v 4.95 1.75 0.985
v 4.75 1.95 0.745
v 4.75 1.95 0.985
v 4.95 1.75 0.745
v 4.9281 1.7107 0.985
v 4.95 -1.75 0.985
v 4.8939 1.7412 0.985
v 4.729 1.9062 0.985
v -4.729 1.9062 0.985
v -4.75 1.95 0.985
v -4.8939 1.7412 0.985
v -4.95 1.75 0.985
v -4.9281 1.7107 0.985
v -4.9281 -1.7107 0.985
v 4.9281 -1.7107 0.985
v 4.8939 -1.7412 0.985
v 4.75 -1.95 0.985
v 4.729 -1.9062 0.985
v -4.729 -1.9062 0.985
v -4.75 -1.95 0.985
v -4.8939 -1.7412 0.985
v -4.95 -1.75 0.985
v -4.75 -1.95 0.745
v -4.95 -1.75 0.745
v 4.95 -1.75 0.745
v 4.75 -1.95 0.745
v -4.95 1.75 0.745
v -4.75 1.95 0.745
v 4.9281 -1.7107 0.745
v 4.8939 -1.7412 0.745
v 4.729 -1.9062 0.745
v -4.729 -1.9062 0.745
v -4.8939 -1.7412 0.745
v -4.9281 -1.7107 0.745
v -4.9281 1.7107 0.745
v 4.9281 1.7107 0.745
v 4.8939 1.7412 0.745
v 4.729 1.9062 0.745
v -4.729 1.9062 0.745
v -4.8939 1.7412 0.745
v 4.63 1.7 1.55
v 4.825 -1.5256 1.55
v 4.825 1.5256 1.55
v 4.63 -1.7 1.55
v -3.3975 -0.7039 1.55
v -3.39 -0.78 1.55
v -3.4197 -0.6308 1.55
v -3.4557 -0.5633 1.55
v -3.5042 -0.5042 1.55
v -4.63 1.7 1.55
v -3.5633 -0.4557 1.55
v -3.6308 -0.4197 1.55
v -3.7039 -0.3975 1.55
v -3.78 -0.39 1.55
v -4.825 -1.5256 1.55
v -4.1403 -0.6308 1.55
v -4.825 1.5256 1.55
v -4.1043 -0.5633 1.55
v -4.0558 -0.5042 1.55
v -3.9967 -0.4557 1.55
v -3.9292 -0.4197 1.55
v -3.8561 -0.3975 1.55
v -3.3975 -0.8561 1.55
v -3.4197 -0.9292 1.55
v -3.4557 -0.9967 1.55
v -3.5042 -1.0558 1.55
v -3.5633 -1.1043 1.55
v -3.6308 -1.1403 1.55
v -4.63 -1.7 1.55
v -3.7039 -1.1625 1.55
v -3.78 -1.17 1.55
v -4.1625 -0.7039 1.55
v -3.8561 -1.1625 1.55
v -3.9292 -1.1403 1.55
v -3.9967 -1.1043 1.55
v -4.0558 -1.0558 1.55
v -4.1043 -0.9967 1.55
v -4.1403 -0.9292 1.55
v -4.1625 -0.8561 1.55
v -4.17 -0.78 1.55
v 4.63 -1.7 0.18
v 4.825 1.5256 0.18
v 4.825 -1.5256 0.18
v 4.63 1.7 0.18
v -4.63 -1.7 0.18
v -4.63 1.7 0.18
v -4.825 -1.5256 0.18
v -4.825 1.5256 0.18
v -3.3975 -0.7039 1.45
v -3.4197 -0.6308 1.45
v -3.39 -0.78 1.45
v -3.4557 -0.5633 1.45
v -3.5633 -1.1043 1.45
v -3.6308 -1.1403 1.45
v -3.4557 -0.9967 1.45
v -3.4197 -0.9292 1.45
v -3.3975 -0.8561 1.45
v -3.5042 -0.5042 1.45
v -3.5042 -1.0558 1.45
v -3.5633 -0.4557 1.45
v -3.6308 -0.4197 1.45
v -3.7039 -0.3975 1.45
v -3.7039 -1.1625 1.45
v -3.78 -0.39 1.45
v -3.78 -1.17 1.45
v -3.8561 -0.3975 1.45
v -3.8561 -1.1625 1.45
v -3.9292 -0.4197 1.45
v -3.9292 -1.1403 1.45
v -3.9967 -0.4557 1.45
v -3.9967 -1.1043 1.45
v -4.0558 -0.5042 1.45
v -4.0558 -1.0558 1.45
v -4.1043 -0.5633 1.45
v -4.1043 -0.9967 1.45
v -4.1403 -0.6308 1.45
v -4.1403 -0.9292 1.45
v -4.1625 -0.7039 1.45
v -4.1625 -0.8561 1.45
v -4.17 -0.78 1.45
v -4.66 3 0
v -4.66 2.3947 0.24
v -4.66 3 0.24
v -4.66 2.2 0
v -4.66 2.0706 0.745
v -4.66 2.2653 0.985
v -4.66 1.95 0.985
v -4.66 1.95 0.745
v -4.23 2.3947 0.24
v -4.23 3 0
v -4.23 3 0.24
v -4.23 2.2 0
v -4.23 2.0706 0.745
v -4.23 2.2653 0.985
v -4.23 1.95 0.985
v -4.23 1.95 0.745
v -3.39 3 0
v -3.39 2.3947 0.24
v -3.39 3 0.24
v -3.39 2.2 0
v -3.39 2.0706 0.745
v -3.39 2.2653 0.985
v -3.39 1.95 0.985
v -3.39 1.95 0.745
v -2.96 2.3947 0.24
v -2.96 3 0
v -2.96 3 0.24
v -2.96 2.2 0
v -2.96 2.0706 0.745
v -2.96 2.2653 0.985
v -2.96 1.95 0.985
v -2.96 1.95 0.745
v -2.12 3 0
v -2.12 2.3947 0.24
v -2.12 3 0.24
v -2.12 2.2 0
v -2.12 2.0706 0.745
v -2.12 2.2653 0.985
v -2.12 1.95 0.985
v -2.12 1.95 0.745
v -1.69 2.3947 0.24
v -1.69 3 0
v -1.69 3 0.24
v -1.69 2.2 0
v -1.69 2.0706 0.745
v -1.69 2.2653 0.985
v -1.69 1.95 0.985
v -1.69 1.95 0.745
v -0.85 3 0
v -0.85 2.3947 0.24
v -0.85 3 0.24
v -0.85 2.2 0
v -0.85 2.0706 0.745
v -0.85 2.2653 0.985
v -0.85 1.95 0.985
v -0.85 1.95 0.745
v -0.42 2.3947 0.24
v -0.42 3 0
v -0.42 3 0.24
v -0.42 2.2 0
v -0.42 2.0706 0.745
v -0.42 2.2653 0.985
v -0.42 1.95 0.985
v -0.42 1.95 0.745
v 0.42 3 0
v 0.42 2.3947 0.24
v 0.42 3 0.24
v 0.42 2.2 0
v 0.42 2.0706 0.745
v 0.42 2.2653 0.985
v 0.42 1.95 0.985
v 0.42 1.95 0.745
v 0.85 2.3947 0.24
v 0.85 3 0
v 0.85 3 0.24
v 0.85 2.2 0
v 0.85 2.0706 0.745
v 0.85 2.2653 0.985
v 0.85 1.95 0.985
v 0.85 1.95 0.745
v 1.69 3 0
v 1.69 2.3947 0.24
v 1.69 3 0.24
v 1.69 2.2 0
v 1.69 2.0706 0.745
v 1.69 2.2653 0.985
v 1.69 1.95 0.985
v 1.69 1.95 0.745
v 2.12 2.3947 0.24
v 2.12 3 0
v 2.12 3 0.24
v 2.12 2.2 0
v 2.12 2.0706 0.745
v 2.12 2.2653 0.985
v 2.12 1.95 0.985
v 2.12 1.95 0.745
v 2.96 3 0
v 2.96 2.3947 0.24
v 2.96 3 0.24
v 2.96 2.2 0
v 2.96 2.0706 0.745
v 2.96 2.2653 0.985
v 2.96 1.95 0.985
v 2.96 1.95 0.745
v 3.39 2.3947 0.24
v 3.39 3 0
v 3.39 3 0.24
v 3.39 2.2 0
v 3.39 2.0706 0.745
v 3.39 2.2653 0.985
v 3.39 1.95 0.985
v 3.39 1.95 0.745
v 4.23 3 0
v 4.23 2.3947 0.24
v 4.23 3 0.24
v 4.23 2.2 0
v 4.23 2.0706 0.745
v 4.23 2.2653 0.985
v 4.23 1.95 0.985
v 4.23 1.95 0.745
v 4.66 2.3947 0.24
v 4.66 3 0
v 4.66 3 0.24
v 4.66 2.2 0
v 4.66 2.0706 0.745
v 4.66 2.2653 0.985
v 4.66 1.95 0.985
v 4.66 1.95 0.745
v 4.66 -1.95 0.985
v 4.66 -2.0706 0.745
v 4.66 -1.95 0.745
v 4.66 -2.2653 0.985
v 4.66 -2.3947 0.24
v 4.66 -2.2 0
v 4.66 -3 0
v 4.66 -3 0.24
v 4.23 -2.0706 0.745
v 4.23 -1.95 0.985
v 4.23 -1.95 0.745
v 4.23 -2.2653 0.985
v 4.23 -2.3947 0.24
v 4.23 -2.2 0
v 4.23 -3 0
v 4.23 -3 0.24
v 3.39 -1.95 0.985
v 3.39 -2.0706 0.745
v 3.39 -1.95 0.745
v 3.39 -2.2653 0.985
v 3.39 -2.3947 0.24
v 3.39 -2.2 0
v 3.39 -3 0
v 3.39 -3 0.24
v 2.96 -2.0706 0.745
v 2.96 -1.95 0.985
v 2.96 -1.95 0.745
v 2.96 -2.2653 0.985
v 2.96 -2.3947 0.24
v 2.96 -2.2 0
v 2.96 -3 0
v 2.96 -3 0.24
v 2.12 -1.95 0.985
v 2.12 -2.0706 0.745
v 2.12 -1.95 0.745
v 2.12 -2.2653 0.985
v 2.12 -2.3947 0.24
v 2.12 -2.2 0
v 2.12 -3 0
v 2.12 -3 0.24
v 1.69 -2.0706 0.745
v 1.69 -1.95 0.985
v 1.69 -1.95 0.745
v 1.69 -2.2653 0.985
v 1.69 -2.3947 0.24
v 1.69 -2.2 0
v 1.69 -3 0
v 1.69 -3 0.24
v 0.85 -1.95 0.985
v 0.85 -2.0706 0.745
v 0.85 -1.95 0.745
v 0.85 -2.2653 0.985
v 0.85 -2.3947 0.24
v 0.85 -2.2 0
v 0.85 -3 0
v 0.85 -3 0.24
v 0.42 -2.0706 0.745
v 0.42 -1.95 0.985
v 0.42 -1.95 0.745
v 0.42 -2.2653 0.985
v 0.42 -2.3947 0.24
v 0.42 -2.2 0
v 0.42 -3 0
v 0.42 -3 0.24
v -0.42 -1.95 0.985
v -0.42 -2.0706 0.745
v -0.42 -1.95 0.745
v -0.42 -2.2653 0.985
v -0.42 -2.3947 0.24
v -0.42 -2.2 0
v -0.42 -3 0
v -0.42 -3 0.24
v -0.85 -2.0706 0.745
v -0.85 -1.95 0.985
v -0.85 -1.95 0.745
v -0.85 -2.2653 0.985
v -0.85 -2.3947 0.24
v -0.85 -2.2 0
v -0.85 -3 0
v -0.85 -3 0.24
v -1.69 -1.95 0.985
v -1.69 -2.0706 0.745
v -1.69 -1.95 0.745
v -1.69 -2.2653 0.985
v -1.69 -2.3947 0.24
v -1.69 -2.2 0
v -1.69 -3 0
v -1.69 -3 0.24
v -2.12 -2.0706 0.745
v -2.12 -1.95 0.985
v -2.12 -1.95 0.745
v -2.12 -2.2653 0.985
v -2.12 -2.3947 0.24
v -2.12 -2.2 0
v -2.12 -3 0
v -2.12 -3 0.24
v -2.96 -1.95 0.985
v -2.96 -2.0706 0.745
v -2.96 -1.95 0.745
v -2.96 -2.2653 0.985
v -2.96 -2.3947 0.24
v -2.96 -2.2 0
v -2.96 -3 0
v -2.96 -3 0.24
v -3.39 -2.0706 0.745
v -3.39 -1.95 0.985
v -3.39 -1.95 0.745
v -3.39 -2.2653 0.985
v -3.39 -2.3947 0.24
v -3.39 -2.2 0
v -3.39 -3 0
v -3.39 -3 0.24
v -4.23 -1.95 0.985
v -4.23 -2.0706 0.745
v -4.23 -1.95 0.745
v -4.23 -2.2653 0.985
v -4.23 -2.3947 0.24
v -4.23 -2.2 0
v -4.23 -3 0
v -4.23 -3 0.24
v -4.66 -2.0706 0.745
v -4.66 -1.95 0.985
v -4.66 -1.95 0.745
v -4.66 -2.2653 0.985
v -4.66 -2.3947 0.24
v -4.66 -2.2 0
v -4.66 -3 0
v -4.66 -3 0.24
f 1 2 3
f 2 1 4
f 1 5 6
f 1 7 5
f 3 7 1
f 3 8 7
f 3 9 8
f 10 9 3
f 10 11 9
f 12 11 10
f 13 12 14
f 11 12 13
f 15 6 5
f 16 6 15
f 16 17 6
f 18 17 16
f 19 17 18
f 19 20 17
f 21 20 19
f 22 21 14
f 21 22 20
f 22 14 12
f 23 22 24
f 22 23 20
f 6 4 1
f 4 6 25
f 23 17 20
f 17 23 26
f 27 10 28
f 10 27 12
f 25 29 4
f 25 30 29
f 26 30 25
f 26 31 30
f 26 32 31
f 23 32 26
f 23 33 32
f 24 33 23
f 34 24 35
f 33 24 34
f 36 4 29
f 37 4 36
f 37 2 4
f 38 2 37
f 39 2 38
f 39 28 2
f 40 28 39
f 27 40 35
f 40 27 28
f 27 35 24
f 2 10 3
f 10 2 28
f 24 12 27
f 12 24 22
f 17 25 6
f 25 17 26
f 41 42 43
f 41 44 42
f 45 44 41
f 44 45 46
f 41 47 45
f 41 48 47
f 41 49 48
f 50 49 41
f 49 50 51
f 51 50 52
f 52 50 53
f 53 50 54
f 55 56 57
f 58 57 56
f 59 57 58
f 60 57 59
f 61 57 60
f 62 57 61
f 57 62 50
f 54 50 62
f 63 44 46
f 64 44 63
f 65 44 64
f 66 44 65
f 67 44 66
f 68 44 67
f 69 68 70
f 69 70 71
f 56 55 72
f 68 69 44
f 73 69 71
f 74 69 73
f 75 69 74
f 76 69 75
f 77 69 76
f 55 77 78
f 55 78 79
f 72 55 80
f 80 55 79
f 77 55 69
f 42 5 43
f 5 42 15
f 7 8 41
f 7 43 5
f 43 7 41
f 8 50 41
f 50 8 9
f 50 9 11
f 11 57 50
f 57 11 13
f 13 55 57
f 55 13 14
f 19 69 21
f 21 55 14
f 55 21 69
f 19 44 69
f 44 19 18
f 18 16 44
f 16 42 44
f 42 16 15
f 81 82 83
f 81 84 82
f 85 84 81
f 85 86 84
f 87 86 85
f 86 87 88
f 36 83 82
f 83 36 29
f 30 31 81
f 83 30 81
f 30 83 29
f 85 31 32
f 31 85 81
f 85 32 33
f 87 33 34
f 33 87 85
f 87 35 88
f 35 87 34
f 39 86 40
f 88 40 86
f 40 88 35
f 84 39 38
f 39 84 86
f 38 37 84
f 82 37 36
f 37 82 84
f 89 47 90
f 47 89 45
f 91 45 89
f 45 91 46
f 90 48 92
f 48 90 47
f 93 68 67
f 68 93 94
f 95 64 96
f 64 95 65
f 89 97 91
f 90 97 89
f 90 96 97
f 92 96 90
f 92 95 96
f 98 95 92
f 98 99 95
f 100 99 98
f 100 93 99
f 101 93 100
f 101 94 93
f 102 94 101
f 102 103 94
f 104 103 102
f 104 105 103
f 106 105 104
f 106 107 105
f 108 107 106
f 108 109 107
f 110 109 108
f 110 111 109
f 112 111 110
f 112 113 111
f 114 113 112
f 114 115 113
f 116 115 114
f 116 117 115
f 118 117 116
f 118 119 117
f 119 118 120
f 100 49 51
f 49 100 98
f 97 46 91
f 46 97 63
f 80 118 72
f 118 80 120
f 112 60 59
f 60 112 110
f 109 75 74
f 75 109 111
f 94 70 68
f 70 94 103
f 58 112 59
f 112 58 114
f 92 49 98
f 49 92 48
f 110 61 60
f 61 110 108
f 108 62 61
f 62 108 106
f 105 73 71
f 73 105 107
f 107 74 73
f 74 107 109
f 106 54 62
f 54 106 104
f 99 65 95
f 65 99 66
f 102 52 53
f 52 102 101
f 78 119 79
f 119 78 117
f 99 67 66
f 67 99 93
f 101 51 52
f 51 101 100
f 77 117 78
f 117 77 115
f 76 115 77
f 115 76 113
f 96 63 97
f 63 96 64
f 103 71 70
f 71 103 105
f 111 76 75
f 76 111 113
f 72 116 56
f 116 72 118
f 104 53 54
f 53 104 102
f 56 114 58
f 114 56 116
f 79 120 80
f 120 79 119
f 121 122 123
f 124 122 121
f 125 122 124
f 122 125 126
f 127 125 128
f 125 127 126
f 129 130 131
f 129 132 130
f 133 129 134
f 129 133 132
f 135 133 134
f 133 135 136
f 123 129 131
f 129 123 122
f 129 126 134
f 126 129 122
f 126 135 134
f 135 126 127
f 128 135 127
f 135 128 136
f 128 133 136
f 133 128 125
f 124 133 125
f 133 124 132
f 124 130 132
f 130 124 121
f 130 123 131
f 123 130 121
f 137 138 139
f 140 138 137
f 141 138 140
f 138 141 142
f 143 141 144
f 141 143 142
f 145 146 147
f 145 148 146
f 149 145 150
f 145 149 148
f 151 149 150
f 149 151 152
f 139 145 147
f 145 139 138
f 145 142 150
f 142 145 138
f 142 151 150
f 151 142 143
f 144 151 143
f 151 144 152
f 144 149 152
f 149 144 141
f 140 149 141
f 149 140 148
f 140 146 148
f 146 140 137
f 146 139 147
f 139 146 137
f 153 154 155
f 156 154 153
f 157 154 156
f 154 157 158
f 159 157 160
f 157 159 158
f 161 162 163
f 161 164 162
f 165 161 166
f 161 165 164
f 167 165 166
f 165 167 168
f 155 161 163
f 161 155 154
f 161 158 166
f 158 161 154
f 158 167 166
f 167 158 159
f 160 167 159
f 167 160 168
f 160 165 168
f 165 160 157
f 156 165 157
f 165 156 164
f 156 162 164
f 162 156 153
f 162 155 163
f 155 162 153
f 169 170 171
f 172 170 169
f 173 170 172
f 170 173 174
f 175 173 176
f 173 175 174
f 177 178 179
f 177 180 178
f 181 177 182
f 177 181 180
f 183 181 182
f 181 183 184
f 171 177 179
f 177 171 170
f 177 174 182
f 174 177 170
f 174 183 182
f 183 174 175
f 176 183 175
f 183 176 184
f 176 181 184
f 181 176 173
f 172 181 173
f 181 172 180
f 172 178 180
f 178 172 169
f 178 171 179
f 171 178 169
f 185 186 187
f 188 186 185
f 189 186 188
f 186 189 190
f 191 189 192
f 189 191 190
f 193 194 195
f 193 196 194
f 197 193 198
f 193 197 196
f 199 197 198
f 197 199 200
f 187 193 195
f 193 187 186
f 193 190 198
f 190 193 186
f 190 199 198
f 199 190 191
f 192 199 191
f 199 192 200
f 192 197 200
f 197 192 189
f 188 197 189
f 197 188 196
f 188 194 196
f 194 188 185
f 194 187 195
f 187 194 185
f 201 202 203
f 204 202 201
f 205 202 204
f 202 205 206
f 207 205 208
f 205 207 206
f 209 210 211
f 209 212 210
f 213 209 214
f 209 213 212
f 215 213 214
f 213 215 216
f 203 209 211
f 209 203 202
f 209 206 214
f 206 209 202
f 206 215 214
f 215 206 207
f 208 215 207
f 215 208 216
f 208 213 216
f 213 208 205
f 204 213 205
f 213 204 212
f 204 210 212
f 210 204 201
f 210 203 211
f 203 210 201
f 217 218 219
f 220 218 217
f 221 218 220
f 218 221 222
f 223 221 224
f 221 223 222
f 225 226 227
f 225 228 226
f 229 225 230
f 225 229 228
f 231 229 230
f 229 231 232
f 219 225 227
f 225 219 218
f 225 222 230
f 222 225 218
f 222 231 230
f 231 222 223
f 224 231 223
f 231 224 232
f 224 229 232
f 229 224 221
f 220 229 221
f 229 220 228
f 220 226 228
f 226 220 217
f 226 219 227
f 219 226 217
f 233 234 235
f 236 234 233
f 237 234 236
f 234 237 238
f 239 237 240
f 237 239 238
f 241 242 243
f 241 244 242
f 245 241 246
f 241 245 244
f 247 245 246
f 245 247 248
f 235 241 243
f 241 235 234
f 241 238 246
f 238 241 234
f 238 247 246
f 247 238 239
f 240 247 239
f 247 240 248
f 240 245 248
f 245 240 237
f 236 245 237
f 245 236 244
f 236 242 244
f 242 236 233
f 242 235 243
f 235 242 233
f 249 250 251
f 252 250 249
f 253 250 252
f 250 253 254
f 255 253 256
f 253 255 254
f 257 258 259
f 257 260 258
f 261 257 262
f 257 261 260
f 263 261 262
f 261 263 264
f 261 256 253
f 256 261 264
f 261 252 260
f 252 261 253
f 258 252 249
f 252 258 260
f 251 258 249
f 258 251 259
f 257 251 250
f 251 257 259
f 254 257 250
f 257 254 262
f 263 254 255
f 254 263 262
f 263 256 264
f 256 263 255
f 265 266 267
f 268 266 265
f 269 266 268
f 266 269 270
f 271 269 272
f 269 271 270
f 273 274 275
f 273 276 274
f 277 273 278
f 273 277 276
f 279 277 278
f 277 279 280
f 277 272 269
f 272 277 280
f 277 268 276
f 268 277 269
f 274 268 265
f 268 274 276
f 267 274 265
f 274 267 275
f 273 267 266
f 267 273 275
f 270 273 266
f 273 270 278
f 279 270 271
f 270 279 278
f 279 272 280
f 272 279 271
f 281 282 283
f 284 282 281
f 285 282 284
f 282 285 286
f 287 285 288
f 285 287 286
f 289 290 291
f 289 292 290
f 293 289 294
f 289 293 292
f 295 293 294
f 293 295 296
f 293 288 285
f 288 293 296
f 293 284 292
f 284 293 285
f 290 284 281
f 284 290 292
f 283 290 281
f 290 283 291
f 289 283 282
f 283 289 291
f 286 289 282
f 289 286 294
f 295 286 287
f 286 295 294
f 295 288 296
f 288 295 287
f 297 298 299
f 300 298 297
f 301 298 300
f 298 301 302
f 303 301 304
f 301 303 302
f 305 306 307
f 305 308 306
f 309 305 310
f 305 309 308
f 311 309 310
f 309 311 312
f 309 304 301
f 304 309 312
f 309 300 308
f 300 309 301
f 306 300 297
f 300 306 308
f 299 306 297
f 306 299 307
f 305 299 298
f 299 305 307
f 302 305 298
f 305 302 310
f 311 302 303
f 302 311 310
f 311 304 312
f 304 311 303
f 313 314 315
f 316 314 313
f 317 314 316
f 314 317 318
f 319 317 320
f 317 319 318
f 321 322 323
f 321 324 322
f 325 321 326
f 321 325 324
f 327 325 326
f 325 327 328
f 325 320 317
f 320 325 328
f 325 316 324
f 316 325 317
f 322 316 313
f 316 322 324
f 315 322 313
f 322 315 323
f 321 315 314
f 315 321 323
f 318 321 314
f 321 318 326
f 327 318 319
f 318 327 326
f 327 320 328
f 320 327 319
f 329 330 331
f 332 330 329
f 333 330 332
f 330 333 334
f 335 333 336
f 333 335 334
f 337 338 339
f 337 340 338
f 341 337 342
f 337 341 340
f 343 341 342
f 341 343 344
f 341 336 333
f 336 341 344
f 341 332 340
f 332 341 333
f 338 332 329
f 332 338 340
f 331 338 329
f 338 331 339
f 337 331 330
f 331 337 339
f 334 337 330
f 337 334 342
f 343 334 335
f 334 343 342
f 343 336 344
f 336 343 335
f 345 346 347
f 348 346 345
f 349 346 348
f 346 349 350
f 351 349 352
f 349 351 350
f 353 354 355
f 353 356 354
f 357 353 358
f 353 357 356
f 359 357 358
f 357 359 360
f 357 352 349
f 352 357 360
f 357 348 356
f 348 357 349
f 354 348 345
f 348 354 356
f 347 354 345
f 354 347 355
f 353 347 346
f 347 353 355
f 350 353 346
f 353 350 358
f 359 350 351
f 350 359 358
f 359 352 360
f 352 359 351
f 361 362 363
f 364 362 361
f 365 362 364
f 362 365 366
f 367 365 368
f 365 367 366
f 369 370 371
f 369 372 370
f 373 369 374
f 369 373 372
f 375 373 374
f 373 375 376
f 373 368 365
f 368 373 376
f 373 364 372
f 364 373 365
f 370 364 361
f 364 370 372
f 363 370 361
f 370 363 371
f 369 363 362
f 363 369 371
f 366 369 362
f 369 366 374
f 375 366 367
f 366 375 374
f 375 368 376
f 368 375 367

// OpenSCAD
pins = 16;
pin_pitch = 1.27;
pin_width = 0.43;
pin_seating = 0.8;
pin_gull_angle = 10;
leadframe_thickness = 0.24;

overall_width = 6;
body_width = 3.9;
body_length = 9.9;
body_thickness = 1.37;

total_thickness = 1.55;

body_length_bevel = 0.25;
body_width_bevel = 0.5;
body_chamfer = 0.2;


leadframe_height = total_thickness - body_thickness/2;

index_mark_offset = min(min(body_width, body_length) * 0.3, 1.5);
index_mark_radius = min(index_mark_offset / 3, 0.5);


difference() {
    body();
    color("#ddd") translate([
        -body_length / 2 + index_mark_offset,
        -body_width / 2 + index_mark_offset,
        total_thickness - 0.1,
    ]) cylinder(h = 10, r = index_mark_radius, $fn=32);
}


translate([pin_pitch * ((pins / 2) - 1) / -2, overall_width / 2, 0]) for(n = [0 : pins / 2 - 1]) {
    translate([pin_pitch * n, 0, 0]) pin();
}
rotate([0, 0, 180]) translate([pin_pitch * ((pins / 2) - 1) / -2, overall_width / 2, 0]) for(n = [0 : pins / 2 - 1]) {
    translate([pin_pitch * n, 0, 0]) pin();
}


module pin() {
    color("#999") rotate([90, 0, 90]) linear_extrude(height = pin_width, center = true) {
        gull_offset = leadframe_height - leadframe_thickness / 2;
        pin_length = (overall_width - body_width) / 2;
        sine = sin(pin_gull_angle);
        cosine = cos(pin_gull_angle);
        polygon([
            [0, 0],
            [-pin_seating, 0],
            [-pin_seating - sine * gull_offset, gull_offset],
            [-pin_length, gull_offset],
            [-pin_length, gull_offset + leadframe_thickness],
            [-pin_seating - sine * (gull_offset + leadframe_thickness) + cosine * leadframe_thickness, gull_offset + leadframe_thickness],
            [-pin_seating - sine * leadframe_thickness + cosine * leadframe_thickness, leadframe_thickness],
            [0, leadframe_thickness],
        ]);
    }
}


module body() {
    color("#555") translate([0, 0, leadframe_height]) {
        linear_extrude(height = leadframe_thickness, center = true) body_outline();
        linear_extrude(
            height = body_thickness / 2,
            scale = [(body_length - body_length_bevel) / body_length, (body_width - body_width_bevel) / body_width]
        ) body_outline();
        
        rotate([180, 0, 0]) linear_extrude(
            height = body_thickness / 2,
            scale = [(body_length - body_length_bevel) / body_length, (body_width - body_width_bevel) / body_width]
        ) body_outline();
    }
}
module body_outline() {
    polygon([
        [ -body_length/2 + body_chamfer, -body_width/2 ],
        [ -body_length/2               , -body_width/2 + body_chamfer ],
        [ -body_length/2               , +body_width/2 - body_chamfer ],
        [ -body_length/2 + body_chamfer, +body_width/2 ],
        [ +body_length/2 - body_chamfer, +body_width/2 ],
        [ +body_length/2               , +body_width/2 - body_chamfer ],
        [ +body_length/2               , -body_width/2 + body_chamfer ],
        [ +body_length/2 - body_chamfer, -body_width/2 ],
    ]);
}
